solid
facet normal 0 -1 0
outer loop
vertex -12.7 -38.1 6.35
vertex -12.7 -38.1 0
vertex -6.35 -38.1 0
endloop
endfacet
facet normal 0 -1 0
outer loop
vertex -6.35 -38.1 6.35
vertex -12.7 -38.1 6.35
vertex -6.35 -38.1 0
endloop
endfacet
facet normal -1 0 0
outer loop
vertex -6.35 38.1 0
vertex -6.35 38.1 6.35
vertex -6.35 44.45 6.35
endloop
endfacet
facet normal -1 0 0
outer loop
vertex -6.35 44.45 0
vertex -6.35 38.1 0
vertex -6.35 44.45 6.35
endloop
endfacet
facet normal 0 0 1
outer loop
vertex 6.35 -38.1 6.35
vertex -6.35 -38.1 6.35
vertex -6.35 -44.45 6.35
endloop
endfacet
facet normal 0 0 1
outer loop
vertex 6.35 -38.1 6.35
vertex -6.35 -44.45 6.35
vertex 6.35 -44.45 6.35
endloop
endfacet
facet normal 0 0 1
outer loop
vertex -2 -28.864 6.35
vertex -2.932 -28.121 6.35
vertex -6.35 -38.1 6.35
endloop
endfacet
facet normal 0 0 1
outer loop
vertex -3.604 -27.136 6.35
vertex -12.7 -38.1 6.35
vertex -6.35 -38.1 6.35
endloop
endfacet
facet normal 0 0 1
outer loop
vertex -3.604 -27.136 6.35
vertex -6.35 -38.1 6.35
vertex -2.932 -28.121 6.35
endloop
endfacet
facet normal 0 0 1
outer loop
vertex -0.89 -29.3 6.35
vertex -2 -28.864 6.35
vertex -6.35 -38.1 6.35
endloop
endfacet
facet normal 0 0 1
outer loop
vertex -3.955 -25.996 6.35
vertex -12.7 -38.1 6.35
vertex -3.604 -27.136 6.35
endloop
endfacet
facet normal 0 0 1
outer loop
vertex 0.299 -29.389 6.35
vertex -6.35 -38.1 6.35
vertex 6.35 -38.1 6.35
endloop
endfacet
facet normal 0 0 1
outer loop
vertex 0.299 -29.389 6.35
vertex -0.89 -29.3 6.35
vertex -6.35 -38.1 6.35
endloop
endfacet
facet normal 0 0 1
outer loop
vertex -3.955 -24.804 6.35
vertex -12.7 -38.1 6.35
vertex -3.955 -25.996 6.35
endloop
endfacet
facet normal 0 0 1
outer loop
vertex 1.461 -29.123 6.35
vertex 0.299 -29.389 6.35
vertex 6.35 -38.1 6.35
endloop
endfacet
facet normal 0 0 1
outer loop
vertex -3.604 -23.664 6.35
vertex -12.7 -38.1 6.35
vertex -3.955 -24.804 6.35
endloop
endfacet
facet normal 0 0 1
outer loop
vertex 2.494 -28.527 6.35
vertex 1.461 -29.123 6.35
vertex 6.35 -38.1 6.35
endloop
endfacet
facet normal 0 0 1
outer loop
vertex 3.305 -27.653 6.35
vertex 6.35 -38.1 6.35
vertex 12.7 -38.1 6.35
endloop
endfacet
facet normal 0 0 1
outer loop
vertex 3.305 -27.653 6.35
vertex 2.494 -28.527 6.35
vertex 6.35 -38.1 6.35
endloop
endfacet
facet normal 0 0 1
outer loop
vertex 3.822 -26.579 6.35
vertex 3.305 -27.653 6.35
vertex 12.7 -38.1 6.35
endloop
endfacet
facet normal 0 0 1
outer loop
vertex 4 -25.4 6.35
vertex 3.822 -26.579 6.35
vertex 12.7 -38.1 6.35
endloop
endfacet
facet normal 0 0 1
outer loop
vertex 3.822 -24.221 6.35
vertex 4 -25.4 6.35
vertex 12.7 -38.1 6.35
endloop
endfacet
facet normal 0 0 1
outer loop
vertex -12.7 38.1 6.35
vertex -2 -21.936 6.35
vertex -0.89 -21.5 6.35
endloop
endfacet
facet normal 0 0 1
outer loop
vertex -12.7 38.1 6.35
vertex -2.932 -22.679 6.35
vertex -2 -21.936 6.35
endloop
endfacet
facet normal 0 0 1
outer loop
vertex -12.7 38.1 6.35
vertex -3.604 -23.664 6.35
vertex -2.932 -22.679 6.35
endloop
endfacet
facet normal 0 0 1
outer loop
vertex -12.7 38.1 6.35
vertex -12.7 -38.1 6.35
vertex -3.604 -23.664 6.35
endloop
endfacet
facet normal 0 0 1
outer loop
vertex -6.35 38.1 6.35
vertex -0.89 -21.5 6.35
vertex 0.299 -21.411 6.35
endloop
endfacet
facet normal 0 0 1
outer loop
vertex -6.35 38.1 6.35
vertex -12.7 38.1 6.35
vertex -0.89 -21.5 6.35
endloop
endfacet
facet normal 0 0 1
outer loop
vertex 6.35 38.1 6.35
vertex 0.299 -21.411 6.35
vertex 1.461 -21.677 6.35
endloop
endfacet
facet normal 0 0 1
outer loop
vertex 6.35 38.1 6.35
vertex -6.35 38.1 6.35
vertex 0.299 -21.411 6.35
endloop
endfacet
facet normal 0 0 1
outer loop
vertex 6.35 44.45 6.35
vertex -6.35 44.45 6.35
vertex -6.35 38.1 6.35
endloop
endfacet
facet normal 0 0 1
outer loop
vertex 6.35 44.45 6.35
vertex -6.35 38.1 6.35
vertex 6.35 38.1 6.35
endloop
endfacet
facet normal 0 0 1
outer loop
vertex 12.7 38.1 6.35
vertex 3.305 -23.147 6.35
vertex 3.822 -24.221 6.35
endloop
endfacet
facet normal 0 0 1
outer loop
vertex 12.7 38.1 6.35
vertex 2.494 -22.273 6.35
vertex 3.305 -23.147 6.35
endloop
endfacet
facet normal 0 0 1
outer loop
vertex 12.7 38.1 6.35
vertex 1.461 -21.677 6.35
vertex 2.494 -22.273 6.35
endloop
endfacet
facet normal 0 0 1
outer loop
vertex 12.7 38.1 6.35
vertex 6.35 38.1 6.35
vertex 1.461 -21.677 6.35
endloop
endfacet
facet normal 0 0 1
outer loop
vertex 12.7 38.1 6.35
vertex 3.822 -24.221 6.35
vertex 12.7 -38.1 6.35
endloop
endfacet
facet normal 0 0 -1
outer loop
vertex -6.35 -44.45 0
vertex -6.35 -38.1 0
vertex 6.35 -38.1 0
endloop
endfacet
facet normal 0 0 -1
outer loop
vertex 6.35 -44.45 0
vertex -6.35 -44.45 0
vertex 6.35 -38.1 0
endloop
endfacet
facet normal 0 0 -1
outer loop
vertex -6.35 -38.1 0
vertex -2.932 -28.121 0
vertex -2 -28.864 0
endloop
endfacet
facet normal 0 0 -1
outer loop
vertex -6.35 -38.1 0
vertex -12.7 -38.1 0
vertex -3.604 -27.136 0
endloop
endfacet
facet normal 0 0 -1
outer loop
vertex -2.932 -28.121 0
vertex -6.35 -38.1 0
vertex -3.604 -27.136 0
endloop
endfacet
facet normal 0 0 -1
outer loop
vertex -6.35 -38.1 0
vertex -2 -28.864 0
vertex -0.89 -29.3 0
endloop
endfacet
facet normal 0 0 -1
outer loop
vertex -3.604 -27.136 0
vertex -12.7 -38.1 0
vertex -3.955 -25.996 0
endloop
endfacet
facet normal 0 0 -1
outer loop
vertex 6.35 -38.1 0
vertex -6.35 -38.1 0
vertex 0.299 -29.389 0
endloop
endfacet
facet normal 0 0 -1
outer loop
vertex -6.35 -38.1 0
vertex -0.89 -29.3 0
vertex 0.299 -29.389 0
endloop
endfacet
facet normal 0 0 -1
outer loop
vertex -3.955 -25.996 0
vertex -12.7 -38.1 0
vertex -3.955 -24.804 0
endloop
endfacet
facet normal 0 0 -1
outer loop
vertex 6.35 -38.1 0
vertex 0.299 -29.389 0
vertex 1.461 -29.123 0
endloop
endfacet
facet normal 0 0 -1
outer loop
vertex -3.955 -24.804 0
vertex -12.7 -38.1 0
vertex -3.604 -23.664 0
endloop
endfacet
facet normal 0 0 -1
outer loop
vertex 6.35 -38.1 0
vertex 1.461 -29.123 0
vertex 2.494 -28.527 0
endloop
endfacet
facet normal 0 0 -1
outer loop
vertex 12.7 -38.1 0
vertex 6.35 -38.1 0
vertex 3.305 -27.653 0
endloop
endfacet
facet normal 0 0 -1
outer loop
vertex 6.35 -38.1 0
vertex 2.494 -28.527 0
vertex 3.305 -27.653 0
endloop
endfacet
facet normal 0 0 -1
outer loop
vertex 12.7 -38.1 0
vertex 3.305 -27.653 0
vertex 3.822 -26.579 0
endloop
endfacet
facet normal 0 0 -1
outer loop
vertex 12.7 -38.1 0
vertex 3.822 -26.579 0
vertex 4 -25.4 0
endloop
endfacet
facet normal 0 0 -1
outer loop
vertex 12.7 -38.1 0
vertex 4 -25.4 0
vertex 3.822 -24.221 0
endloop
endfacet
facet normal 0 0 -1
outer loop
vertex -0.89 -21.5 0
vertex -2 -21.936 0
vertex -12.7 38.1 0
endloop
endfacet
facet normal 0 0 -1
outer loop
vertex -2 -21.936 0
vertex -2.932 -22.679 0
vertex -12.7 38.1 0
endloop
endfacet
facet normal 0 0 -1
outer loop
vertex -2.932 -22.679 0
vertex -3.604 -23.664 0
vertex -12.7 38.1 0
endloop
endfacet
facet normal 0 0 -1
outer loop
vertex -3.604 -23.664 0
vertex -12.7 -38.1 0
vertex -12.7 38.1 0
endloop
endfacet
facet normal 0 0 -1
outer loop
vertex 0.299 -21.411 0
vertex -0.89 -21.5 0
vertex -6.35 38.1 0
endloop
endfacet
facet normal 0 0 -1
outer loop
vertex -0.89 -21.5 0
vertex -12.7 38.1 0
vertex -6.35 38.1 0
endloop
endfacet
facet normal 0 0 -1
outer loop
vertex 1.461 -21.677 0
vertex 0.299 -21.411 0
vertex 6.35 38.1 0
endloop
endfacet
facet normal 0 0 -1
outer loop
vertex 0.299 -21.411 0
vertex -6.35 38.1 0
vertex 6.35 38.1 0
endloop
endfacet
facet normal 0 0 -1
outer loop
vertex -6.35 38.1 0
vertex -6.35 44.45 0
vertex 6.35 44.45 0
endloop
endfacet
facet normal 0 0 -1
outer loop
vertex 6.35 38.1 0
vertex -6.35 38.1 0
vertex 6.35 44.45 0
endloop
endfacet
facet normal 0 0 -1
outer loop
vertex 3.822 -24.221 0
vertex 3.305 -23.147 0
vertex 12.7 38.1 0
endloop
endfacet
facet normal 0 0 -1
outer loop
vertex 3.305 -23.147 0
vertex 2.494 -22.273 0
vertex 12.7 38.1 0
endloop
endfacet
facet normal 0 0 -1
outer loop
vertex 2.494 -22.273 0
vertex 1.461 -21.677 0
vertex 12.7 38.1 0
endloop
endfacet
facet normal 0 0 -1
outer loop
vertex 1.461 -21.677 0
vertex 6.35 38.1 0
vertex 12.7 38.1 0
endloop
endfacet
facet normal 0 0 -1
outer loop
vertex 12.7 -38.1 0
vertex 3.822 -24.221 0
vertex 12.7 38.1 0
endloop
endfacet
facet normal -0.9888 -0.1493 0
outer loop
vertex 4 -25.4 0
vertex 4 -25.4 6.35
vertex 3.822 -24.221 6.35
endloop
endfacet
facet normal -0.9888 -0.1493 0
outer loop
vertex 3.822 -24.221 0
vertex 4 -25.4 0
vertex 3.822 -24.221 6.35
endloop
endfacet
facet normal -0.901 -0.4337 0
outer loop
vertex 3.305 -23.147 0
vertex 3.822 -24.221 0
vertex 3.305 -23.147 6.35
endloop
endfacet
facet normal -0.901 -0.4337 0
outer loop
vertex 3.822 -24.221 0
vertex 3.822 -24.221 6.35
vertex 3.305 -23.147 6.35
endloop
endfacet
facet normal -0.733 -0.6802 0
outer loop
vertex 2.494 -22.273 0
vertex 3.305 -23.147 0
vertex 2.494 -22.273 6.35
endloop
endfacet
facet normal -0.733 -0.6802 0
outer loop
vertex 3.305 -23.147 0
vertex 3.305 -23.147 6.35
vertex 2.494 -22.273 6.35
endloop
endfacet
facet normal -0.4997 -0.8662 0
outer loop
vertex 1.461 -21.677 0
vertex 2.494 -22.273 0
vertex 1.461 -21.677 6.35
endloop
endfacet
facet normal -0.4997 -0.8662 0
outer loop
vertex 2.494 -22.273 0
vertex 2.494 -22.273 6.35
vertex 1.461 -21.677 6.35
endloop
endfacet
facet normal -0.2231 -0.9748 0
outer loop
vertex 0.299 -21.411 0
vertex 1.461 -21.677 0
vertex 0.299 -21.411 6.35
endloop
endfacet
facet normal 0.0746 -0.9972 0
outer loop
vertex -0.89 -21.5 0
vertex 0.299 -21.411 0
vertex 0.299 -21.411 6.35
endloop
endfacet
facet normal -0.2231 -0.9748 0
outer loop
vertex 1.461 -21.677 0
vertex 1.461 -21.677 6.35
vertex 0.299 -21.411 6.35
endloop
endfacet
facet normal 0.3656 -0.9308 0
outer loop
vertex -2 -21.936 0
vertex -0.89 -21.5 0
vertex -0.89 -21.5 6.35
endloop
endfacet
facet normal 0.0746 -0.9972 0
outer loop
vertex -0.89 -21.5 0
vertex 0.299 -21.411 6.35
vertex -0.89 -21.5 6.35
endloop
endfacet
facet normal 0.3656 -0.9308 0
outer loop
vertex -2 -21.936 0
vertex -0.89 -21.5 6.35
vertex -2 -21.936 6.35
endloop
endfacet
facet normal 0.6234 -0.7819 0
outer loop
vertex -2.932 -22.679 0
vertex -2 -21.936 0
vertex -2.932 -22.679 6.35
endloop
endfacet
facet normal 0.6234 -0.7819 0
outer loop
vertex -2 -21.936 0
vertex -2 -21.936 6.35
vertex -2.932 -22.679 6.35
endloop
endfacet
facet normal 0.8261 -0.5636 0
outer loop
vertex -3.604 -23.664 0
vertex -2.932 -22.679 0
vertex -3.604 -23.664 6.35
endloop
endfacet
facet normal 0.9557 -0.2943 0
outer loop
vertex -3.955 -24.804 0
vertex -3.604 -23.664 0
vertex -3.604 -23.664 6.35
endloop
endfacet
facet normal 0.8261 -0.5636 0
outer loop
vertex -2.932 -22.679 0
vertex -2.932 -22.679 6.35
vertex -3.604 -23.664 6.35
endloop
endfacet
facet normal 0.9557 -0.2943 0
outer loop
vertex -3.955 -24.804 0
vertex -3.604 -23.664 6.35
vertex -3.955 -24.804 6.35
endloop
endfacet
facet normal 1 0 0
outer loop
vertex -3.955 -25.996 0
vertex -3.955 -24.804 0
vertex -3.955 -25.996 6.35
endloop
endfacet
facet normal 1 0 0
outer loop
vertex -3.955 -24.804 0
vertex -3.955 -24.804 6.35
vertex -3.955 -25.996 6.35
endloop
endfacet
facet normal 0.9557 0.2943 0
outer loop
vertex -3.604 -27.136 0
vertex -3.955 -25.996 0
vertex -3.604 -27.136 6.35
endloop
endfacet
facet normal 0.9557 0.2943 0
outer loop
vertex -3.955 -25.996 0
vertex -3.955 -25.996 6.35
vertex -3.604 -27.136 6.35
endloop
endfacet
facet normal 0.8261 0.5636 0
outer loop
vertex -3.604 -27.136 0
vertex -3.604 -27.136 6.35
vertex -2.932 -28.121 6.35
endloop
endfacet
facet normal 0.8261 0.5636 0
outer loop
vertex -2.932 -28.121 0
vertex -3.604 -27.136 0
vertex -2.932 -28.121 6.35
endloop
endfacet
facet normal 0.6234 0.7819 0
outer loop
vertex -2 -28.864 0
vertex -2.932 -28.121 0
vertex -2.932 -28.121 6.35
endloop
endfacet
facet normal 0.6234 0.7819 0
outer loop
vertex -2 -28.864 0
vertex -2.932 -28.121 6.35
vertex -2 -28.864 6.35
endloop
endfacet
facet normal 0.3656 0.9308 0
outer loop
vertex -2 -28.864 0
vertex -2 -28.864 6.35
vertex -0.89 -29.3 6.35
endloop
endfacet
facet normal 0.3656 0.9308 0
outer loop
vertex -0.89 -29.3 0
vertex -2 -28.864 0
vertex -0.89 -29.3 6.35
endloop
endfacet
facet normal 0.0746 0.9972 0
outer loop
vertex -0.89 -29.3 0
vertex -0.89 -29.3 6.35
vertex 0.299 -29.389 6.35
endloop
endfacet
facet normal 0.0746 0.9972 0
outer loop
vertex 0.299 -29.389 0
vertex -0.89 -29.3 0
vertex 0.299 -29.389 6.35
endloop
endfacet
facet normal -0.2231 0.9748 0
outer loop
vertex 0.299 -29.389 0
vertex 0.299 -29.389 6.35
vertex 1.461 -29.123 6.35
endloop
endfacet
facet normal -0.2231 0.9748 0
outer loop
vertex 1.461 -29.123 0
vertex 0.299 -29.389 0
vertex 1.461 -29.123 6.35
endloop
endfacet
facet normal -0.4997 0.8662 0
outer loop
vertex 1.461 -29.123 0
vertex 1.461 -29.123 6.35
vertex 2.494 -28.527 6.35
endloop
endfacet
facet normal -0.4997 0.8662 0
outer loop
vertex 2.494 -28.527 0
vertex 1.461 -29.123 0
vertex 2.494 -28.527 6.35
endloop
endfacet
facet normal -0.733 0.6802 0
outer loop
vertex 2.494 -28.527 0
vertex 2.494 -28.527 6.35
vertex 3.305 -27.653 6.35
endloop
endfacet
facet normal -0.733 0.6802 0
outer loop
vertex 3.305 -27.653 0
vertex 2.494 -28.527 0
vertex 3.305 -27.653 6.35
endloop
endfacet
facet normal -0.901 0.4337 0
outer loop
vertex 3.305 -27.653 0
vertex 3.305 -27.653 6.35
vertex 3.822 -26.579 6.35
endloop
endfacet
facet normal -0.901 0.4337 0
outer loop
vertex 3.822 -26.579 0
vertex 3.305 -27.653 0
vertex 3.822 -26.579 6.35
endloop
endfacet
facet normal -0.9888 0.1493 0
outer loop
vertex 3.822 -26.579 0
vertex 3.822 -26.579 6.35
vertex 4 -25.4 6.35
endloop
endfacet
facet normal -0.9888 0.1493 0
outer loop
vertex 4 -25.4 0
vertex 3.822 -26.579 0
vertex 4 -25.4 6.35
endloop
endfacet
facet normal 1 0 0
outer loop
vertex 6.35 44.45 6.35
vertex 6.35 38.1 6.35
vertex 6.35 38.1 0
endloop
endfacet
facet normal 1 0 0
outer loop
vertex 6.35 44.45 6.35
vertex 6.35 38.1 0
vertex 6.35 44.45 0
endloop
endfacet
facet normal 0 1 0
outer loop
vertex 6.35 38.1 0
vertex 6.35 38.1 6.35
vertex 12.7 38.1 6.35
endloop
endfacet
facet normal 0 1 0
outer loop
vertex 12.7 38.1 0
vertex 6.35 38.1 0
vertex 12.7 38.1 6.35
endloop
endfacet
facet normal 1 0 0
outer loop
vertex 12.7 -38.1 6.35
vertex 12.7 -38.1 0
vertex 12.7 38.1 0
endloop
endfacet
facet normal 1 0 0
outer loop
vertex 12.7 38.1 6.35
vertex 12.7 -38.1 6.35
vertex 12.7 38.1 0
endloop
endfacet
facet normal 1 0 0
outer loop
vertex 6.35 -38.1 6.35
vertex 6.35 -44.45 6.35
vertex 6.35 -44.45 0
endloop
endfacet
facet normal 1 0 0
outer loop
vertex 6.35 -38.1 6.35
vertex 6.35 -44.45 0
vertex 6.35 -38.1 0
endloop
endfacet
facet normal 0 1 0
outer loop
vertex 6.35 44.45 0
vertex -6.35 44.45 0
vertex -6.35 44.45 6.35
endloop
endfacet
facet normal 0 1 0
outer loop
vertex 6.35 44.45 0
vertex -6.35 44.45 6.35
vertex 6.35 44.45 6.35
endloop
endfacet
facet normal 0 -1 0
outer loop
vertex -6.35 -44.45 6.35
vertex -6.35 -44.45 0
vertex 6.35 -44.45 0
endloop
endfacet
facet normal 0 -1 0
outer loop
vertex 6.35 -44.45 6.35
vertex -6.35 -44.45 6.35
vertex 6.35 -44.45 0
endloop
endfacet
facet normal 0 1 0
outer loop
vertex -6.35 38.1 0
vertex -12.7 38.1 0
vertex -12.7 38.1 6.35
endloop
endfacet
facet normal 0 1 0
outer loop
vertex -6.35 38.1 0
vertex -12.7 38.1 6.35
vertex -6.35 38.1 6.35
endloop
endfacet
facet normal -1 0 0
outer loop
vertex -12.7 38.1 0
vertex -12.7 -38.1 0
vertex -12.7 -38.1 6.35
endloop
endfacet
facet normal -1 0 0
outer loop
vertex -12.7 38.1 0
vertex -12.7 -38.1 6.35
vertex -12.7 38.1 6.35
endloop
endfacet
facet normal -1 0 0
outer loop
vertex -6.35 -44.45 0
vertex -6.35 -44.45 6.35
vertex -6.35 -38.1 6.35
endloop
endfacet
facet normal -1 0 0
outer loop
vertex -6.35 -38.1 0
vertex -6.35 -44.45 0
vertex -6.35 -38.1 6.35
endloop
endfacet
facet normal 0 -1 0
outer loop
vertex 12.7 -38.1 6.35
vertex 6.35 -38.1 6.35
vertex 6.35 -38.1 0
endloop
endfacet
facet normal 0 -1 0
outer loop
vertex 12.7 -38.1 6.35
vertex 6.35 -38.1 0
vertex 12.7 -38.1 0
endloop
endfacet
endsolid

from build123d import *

# Parameters (mm, degrees)
SKETCH1_W           = 25.4
SKETCH1_H           = 76.2
SKETCH1_W_2         = 12.7
SKETCH1_H_2         = 6.35
BOSS_EXTRUDE1_DEPTH = 6.35
SKETCH2_R           = 4
CUT_EXTRUDE1_DEPTH  = 47.6627796


with BuildPart() as part:
    # Sketch1 → Boss-Extrude1 (new body)
    with BuildSketch(Plane.XY):
        Rectangle(SKETCH1_W, SKETCH1_H)
        with Locations((0, -41.275)):
            Rectangle(SKETCH1_W_2, SKETCH1_H_2)
        with Locations((0, 41.275)):
            Rectangle(SKETCH1_W_2, SKETCH1_H_2)
    extrude(amount=BOSS_EXTRUDE1_DEPTH)

    # Sketch2 → Cut-Extrude1 (cut, through all)
    with BuildSketch(Plane.XY.offset(6.35)):
        with Locations((0, -25.4)):
            Circle(SKETCH2_R)
    extrude(amount=-CUT_EXTRUDE1_DEPTH, mode=Mode.SUBTRACT)


solid = part.part
